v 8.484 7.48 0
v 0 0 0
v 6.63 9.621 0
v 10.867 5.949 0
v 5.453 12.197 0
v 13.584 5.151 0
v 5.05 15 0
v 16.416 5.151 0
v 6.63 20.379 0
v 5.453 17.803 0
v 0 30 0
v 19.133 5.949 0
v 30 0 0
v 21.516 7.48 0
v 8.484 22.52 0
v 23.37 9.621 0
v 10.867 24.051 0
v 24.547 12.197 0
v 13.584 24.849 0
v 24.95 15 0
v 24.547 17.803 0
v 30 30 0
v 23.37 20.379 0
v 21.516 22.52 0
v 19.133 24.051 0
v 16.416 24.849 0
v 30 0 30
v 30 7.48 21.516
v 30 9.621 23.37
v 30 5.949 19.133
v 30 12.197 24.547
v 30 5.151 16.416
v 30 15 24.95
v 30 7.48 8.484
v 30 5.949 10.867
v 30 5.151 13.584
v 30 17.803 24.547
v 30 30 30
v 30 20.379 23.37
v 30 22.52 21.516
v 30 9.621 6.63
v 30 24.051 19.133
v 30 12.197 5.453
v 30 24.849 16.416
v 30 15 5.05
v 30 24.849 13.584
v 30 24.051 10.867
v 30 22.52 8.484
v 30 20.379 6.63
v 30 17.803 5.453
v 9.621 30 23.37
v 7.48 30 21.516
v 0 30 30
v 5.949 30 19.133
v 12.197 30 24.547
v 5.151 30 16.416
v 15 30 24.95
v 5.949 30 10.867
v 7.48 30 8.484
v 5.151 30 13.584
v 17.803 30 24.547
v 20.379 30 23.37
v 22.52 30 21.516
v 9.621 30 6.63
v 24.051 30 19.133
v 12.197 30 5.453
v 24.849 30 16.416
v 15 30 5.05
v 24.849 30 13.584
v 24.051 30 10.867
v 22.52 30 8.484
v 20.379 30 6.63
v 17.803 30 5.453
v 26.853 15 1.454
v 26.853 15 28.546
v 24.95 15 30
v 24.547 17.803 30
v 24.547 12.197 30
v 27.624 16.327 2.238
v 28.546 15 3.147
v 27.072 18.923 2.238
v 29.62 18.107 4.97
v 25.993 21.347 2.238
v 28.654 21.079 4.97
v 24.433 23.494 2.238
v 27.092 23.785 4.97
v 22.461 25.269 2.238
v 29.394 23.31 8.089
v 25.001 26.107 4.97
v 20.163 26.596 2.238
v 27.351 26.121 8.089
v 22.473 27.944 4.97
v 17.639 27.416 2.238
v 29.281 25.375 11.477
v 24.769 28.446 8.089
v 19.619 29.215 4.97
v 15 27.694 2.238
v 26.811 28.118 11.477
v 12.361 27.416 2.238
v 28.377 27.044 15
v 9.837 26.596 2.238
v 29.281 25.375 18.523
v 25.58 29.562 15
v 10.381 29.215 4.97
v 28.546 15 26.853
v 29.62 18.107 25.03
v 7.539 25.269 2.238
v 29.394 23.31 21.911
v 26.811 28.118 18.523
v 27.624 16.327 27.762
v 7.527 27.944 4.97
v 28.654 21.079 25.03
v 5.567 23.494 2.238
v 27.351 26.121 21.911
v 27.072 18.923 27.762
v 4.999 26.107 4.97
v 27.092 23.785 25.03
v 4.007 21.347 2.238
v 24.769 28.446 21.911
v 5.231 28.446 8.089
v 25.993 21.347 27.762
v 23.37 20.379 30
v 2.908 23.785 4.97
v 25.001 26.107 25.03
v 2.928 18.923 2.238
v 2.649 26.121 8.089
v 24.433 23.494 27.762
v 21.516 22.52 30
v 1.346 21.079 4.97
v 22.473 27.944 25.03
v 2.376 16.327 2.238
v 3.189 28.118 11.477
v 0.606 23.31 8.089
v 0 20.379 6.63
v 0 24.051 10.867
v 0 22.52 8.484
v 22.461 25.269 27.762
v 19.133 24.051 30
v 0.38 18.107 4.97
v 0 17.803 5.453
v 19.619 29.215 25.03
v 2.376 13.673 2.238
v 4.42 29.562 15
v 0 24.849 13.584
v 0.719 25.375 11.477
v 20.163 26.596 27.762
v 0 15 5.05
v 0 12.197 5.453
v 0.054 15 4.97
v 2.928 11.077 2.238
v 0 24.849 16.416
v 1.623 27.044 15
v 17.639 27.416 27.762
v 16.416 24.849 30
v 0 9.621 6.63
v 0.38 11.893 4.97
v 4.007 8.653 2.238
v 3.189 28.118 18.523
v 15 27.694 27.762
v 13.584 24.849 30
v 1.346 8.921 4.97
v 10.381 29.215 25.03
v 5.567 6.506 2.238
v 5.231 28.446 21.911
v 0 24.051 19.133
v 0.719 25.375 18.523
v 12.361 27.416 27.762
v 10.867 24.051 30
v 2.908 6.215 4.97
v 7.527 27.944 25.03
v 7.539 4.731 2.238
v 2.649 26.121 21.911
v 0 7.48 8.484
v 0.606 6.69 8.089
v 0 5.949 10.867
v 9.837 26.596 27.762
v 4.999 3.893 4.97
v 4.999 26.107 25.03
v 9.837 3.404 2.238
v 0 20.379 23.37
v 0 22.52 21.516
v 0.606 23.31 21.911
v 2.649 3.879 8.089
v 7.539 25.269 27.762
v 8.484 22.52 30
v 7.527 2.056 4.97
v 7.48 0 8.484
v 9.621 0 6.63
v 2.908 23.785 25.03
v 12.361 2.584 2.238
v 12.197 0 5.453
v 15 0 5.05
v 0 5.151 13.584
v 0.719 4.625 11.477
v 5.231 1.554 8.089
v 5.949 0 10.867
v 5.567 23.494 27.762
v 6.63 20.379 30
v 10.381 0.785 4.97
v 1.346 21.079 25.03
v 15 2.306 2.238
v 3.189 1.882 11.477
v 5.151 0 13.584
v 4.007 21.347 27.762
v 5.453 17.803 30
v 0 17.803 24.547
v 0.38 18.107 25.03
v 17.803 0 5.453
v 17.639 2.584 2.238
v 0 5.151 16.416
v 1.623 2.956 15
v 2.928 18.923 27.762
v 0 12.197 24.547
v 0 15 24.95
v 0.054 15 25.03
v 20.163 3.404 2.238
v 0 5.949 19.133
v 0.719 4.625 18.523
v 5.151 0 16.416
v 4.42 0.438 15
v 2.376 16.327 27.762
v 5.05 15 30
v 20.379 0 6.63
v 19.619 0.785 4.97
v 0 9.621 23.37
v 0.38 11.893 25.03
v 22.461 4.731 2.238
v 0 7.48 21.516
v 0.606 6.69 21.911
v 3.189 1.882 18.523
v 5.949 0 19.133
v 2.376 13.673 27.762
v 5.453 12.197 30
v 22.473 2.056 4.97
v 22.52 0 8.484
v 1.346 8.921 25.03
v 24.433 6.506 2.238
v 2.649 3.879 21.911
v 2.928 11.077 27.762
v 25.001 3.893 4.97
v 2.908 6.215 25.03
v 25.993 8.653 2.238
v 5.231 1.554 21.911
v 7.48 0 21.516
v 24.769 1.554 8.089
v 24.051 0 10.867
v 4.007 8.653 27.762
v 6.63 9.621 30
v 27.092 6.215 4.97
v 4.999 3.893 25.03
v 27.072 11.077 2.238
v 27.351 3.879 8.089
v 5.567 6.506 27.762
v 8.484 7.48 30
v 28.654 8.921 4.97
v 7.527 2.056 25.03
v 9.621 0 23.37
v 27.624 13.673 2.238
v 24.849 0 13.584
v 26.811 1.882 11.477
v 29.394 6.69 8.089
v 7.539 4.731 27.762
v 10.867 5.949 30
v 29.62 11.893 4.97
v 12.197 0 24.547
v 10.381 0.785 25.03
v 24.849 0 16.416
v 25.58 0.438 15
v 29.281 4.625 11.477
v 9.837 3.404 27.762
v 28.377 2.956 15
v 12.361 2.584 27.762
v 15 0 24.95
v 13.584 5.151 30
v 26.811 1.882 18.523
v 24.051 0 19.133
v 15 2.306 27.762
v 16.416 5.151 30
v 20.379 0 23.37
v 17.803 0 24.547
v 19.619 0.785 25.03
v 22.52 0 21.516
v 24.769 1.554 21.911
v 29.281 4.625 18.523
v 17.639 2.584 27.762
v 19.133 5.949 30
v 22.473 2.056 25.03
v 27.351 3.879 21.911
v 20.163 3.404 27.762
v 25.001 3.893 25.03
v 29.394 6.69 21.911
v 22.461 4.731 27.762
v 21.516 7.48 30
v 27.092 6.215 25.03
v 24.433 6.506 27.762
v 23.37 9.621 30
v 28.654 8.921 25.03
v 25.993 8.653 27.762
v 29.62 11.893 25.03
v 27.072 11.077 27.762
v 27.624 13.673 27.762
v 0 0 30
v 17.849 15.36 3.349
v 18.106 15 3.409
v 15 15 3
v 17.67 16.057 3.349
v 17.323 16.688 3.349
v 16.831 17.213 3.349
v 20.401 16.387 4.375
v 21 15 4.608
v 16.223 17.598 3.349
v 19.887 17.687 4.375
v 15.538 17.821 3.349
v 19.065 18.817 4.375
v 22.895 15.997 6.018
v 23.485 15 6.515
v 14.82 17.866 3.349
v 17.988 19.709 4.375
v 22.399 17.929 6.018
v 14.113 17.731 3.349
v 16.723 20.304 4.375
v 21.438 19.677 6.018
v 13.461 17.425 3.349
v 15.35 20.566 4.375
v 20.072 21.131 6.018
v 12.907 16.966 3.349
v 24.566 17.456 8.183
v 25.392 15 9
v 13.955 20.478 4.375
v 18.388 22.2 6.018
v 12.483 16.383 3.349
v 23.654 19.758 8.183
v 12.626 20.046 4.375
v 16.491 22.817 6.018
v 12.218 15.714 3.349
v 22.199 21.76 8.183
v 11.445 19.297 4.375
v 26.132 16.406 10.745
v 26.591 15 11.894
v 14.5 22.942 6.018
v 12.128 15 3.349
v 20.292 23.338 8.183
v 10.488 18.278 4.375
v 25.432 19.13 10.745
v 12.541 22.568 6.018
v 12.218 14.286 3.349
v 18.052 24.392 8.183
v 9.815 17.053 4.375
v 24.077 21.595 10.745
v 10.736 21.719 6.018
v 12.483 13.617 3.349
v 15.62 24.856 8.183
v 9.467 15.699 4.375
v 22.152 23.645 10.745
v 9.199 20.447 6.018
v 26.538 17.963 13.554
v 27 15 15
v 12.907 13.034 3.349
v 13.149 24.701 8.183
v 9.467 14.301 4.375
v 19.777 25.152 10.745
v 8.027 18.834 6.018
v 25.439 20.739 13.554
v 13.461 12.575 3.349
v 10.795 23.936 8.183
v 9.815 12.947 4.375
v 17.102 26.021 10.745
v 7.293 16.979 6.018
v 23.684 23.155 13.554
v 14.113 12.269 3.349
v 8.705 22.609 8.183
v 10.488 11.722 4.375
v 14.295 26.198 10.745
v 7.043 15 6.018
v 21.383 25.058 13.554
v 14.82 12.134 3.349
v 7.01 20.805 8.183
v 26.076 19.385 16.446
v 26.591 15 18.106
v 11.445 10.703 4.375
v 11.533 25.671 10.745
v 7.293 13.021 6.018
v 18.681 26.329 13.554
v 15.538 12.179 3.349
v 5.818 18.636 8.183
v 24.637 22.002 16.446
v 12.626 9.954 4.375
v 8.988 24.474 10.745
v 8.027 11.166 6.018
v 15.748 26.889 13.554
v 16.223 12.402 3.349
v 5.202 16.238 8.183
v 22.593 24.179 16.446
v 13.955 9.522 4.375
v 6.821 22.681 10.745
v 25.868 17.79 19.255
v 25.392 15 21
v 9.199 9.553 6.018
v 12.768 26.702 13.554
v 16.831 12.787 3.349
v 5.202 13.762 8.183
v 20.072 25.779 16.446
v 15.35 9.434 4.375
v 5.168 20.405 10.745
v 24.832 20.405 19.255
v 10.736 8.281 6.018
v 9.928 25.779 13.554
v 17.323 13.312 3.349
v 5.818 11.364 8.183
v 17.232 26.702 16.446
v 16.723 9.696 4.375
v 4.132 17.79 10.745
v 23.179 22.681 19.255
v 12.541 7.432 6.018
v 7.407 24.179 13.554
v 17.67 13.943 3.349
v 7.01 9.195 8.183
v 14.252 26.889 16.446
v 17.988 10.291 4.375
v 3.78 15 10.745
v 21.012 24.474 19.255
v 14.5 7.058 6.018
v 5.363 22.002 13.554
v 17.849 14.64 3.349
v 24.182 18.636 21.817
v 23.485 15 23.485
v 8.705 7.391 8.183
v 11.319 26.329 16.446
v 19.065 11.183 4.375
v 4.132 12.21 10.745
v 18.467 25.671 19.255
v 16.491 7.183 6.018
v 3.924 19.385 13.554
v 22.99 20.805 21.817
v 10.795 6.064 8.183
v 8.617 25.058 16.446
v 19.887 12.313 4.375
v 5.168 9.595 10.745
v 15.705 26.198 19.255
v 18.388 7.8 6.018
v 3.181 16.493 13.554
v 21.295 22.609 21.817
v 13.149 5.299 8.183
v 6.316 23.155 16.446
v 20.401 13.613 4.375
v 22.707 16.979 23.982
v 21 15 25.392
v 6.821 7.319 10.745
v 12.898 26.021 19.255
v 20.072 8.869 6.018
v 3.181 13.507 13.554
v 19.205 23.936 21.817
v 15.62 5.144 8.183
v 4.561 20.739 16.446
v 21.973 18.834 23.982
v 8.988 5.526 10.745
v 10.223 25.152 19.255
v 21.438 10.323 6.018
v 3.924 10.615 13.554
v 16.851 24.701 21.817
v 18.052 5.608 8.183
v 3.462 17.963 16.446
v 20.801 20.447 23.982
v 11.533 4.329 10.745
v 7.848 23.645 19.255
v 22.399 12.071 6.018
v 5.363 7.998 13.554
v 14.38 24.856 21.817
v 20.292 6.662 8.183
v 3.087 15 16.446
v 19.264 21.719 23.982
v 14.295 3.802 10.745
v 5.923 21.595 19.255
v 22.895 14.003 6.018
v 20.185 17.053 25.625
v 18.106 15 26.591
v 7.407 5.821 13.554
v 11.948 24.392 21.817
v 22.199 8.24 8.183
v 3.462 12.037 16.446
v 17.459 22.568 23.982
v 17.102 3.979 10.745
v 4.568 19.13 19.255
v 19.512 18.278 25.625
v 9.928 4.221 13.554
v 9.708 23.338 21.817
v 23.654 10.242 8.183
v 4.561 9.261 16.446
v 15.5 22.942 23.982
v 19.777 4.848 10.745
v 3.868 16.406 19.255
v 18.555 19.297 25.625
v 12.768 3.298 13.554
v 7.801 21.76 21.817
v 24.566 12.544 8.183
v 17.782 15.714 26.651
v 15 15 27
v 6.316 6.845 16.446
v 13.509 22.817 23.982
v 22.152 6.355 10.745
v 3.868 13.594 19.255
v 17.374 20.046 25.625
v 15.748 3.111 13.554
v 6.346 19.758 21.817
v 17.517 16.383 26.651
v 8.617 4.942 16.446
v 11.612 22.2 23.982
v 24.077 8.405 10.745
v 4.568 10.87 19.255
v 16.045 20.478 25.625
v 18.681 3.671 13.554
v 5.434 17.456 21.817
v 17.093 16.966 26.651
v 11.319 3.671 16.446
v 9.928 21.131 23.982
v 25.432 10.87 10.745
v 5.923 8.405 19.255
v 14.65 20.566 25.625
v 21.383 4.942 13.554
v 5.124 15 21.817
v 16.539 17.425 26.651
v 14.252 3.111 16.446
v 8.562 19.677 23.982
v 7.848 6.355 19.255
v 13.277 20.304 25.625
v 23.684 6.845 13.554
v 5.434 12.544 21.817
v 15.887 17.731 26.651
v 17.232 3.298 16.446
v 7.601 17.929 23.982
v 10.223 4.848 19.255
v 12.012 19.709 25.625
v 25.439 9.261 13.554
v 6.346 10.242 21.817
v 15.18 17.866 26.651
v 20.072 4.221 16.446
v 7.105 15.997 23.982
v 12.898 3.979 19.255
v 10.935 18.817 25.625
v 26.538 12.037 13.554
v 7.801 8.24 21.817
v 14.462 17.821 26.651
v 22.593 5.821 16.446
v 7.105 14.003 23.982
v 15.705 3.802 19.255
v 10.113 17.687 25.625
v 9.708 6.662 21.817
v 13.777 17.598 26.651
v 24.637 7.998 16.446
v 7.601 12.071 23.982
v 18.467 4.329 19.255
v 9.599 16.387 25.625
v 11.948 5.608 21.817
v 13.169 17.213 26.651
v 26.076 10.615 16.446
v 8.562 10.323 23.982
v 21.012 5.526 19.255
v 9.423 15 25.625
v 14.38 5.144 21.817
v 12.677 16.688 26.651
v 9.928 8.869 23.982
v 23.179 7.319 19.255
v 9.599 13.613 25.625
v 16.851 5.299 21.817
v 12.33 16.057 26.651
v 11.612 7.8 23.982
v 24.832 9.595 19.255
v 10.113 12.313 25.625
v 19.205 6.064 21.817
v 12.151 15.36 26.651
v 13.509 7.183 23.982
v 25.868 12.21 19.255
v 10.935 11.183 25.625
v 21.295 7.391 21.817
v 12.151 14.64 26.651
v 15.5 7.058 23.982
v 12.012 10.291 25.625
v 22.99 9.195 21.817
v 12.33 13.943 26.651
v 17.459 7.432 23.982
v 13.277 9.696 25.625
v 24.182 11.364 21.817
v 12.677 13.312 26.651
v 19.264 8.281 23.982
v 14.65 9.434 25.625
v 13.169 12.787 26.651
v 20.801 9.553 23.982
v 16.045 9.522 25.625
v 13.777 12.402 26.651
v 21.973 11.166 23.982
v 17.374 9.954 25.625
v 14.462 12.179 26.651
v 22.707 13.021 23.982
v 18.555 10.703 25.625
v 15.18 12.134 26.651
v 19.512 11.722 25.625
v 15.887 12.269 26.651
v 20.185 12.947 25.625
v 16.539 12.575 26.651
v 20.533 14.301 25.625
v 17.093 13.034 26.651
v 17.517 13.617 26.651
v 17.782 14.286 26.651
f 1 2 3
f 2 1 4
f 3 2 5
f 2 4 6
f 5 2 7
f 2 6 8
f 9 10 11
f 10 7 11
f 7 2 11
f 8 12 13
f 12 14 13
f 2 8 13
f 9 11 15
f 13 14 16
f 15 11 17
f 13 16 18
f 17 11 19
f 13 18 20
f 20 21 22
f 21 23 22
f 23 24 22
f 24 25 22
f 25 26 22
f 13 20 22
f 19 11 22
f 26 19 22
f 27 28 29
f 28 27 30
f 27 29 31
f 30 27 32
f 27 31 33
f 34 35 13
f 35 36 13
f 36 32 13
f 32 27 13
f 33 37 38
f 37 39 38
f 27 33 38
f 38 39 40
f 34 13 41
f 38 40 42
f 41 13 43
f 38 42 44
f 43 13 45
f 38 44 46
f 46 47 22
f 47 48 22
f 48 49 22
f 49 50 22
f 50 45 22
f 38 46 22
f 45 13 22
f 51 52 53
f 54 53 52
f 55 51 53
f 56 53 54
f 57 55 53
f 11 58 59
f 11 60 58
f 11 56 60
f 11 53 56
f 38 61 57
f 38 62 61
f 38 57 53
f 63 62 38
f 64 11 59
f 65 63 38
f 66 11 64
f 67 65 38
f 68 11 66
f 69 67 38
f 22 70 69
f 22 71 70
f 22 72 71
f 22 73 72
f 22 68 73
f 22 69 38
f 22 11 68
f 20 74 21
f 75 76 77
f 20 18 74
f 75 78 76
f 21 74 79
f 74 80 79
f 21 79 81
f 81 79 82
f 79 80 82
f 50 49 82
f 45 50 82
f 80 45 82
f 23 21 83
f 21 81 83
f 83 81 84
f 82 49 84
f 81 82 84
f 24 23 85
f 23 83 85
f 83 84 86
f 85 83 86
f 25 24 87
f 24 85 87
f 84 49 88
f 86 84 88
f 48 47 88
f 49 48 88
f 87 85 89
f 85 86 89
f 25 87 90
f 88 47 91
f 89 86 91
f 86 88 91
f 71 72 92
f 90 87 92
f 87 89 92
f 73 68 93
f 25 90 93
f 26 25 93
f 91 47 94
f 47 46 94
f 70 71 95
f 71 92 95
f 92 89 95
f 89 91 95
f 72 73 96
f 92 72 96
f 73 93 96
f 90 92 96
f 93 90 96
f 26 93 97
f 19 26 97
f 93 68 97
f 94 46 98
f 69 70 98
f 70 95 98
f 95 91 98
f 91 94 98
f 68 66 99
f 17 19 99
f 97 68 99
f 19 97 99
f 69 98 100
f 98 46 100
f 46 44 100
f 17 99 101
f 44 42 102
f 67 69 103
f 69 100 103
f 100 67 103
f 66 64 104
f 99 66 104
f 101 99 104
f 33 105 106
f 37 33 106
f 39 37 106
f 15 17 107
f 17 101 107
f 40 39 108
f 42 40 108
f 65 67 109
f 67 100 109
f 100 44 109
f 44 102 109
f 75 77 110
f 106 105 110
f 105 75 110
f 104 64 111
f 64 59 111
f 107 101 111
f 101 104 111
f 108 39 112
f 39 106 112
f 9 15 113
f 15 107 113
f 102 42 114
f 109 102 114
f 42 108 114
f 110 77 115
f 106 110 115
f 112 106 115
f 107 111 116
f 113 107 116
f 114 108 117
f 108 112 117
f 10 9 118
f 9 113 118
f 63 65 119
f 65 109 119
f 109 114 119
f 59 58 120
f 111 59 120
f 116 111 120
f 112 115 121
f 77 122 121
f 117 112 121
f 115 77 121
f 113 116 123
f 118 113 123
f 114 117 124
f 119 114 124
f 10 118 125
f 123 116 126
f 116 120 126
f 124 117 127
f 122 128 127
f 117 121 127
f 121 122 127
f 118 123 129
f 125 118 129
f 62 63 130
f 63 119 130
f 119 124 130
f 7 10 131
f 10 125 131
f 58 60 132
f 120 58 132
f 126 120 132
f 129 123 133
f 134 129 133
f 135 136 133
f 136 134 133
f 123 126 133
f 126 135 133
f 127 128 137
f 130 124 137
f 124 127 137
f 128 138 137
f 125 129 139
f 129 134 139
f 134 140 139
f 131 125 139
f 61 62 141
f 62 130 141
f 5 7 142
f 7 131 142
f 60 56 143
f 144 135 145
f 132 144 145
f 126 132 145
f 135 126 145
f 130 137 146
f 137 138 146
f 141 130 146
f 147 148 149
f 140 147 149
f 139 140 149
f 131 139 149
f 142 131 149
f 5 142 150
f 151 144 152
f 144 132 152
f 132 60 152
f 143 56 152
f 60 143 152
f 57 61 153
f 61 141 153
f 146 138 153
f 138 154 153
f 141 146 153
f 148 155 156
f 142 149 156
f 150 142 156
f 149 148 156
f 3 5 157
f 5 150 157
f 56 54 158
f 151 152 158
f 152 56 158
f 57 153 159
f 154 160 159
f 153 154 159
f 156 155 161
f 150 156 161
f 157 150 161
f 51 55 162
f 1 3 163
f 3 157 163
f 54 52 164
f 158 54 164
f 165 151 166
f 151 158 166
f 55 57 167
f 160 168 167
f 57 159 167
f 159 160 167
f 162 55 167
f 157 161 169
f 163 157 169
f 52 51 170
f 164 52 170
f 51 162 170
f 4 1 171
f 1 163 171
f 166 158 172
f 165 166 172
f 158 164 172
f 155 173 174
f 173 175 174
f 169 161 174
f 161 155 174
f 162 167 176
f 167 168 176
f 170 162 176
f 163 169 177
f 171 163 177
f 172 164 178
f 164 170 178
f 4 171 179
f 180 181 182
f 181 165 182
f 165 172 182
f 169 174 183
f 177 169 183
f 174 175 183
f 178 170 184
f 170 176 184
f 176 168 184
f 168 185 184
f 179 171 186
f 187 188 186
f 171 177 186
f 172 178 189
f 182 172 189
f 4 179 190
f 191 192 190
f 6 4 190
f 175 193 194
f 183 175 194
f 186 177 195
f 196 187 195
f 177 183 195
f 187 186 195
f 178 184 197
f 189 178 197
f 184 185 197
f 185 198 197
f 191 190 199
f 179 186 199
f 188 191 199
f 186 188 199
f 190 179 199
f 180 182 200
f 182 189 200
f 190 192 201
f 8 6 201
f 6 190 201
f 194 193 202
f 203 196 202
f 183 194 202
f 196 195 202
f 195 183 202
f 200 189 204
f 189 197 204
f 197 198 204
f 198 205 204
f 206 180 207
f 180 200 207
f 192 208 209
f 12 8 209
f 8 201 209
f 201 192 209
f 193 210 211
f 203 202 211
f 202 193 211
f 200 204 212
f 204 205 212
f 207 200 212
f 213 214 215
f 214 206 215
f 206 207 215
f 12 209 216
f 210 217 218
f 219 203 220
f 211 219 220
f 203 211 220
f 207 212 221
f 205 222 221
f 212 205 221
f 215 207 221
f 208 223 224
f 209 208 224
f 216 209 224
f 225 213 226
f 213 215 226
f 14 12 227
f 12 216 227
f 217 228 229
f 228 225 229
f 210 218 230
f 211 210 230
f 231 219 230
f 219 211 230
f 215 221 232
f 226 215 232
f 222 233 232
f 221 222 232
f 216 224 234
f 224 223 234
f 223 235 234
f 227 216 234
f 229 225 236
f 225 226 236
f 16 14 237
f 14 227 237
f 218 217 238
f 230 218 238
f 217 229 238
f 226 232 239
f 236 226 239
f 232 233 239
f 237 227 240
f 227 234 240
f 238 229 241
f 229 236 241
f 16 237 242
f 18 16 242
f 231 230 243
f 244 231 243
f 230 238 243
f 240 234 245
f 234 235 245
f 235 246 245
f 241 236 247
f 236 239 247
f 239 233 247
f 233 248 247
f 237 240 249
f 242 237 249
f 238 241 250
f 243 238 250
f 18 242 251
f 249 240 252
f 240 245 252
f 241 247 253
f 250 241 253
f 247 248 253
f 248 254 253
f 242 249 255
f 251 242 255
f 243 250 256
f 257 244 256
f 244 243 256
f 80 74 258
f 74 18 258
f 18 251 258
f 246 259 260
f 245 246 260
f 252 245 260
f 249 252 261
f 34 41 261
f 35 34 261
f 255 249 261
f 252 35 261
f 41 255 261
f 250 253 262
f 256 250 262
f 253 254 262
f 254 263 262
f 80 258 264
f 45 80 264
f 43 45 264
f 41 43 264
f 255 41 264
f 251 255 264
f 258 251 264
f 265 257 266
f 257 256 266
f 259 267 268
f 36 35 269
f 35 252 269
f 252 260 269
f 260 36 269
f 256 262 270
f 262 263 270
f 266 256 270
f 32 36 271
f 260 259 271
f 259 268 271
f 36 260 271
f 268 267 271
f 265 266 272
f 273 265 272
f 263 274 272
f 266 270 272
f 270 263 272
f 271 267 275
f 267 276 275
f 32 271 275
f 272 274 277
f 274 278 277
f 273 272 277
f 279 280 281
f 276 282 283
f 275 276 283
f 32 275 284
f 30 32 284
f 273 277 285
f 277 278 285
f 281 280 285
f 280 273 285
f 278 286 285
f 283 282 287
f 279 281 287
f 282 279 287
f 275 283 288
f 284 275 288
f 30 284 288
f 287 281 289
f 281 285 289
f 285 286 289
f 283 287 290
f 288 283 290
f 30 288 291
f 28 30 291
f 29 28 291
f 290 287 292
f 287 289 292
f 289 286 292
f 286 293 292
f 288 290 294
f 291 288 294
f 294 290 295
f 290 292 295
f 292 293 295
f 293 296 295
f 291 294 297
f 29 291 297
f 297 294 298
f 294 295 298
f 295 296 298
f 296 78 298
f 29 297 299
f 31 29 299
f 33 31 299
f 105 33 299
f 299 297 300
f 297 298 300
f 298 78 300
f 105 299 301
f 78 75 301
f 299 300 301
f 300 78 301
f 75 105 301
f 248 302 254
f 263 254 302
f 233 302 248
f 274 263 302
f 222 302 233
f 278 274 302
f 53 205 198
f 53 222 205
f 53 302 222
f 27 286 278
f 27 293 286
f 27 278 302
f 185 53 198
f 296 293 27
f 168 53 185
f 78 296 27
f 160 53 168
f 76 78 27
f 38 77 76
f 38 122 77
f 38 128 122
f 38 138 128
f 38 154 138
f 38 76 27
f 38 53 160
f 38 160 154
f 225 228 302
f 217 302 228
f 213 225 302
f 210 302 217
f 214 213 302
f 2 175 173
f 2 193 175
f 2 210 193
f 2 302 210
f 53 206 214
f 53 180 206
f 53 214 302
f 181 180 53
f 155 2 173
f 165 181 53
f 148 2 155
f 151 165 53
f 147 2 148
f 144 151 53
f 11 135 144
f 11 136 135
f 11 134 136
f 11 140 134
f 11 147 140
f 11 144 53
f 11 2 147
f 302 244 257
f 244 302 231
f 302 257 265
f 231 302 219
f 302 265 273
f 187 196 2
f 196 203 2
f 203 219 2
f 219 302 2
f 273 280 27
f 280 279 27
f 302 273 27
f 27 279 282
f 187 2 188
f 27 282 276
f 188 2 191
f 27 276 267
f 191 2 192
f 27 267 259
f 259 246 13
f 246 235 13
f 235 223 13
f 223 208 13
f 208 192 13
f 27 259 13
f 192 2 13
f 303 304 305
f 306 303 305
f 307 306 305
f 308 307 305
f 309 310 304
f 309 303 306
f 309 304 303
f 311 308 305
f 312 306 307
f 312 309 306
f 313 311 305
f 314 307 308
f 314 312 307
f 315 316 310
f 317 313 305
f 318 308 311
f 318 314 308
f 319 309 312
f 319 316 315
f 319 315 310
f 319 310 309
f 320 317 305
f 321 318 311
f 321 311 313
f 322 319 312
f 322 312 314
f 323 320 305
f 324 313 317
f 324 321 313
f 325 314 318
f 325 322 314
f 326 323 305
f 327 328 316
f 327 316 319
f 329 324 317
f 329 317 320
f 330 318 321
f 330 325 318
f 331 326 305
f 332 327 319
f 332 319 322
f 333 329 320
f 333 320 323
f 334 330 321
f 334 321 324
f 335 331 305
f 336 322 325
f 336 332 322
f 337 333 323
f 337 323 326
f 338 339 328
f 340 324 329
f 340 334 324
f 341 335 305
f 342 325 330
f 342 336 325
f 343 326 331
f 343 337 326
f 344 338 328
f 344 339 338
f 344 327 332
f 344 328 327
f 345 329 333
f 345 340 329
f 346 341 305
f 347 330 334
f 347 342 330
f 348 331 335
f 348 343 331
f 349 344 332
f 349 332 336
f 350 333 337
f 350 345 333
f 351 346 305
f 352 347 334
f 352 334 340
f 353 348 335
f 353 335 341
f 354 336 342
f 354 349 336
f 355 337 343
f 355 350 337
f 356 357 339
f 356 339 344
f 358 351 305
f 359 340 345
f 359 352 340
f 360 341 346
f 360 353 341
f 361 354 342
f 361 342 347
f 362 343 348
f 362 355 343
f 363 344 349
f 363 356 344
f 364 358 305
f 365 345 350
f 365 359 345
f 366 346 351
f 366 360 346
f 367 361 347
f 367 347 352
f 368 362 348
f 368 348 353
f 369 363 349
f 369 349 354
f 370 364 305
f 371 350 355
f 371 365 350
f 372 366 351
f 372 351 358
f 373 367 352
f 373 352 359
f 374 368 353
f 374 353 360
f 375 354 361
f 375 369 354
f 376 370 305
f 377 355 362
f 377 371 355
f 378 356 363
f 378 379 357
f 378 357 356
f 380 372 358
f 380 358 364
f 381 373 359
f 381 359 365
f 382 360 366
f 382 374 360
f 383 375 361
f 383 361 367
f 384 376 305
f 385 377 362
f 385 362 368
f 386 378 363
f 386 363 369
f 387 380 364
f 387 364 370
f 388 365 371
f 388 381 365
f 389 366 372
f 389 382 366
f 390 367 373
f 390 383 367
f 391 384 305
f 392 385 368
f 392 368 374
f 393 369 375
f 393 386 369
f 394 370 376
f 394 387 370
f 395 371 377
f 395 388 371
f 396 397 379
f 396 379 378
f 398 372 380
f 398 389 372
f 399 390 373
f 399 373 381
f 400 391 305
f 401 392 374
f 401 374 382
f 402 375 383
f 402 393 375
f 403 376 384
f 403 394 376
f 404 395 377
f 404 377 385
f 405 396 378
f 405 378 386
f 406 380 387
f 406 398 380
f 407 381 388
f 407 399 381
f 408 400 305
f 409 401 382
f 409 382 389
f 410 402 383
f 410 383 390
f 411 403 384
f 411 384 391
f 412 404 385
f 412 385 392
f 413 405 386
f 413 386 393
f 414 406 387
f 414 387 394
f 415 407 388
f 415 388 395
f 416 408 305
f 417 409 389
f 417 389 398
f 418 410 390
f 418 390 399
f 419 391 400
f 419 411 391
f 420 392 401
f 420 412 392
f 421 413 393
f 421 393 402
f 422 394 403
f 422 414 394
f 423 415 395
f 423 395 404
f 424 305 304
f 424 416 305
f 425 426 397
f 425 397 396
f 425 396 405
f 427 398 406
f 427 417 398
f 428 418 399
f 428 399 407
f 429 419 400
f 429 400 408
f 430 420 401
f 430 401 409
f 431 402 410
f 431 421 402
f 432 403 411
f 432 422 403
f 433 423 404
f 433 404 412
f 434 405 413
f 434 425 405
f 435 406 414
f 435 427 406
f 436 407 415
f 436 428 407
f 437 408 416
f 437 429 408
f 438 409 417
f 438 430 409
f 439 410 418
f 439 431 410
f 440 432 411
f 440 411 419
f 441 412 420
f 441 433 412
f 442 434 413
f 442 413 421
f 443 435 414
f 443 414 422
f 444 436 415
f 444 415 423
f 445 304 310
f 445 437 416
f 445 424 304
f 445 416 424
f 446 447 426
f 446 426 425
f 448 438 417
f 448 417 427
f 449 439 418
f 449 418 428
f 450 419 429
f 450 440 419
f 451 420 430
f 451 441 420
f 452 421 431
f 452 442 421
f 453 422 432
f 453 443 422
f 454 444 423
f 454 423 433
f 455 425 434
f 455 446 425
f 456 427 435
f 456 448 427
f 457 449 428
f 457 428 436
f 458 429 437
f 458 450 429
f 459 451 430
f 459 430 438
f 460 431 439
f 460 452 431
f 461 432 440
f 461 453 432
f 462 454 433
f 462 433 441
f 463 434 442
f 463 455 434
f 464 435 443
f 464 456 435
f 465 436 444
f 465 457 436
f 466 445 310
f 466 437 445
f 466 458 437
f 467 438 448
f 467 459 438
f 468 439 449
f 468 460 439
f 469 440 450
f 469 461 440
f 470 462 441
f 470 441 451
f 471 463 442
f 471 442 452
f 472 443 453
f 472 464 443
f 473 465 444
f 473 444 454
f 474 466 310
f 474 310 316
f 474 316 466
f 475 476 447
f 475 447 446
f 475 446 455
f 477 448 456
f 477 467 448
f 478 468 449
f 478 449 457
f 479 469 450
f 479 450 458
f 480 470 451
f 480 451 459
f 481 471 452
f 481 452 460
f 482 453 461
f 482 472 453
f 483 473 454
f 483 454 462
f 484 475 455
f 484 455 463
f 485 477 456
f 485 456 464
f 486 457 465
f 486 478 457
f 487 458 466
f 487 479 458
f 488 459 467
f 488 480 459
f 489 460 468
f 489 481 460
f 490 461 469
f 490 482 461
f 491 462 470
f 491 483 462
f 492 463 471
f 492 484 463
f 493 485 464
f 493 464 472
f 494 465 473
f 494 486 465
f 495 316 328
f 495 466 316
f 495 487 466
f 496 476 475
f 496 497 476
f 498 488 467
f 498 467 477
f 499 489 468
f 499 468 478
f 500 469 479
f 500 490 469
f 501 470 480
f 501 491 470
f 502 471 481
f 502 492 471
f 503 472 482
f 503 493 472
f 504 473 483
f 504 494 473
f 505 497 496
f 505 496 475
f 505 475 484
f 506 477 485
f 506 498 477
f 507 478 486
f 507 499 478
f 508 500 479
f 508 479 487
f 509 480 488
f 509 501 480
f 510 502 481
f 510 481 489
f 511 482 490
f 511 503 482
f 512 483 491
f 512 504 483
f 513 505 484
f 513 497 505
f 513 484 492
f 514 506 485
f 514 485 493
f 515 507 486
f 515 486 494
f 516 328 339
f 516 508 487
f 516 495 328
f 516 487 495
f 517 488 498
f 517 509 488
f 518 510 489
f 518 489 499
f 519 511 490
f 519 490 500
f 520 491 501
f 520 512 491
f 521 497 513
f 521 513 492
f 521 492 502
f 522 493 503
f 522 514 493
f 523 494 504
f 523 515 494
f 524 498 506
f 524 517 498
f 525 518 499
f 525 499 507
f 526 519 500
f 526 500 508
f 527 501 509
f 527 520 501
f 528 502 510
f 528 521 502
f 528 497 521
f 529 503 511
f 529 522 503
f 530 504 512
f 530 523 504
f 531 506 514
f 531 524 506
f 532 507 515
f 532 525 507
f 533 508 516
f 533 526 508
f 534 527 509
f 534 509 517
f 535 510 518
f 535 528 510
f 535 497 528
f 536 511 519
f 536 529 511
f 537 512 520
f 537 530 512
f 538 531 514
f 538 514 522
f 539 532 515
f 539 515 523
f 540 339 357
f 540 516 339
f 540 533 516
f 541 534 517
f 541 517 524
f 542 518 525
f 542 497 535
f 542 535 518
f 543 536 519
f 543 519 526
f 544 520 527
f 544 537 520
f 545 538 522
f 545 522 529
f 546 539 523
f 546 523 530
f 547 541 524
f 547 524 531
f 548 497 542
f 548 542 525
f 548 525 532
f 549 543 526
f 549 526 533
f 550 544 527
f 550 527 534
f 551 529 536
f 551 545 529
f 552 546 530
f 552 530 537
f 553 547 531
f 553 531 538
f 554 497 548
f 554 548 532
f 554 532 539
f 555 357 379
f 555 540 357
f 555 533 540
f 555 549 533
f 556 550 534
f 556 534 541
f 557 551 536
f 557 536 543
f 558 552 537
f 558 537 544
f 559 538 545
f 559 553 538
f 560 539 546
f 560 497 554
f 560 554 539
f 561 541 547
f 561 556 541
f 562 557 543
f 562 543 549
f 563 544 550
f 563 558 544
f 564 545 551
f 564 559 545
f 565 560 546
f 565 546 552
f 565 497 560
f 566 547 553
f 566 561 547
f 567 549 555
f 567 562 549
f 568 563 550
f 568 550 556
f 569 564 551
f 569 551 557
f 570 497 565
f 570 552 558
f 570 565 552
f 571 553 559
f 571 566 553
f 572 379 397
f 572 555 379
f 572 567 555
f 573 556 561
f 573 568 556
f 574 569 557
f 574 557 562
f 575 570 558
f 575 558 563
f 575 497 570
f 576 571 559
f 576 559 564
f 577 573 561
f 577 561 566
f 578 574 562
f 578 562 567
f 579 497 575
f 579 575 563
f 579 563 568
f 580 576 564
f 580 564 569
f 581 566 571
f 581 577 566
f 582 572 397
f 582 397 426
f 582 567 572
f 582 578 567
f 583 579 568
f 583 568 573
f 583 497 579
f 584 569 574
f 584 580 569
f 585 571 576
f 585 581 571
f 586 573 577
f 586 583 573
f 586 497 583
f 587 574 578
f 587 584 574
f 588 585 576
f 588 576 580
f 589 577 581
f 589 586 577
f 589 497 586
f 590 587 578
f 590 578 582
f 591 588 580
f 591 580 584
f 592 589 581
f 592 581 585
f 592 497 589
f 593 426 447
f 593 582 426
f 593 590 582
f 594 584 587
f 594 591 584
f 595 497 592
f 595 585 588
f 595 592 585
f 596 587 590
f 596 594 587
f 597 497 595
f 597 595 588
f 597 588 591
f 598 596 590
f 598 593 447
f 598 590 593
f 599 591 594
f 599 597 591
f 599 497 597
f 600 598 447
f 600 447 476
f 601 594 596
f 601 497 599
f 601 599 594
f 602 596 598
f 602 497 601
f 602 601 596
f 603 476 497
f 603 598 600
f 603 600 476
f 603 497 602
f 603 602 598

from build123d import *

# Parameters (mm, degrees)
BOX_W     = 30
BOX_H     = 30
BOX_DEPTH = 30


with BuildPart() as esfera001:
    # Sphere001 → Sphere001 (revolve)
    with BuildSketch(Plane(origin=(15, 15, 15), x_dir=(1, 0, 0), z_dir=(0, -1, 0))):
        with BuildLine():
            ThreePointArc((0, -12), (12, 0), (0, 12))
            Line((0, 12), (0, -12))
        make_face()
    revolve(axis=Axis((15, 15, 15), (0, 0, 1)))


with BuildPart() as esfera:
    # Sphere → Sphere (revolve)
    with BuildSketch(Plane(origin=(15, 15, 15), x_dir=(1, 0, 0), z_dir=(0, -1, 0))):
        with BuildLine():
            ThreePointArc((0, -18), (18, 0), (0, 18))
            Line((0, 18), (0, -18))
        make_face()
    revolve(axis=Axis((15, 15, 15), (0, 0, 1)))


with BuildPart() as fusion:
    # Box → Box (new body)
    with BuildSketch(Plane.XY):
        with Locations((15, 15)):
            Rectangle(BOX_W, BOX_H)
    extrude(amount=BOX_DEPTH)

    # Cut: cut Esfera
    add(esfera.part, mode=Mode.SUBTRACT)

    # Fusion: union Esfera001
    add(esfera001.part)


solid = fusion.part
